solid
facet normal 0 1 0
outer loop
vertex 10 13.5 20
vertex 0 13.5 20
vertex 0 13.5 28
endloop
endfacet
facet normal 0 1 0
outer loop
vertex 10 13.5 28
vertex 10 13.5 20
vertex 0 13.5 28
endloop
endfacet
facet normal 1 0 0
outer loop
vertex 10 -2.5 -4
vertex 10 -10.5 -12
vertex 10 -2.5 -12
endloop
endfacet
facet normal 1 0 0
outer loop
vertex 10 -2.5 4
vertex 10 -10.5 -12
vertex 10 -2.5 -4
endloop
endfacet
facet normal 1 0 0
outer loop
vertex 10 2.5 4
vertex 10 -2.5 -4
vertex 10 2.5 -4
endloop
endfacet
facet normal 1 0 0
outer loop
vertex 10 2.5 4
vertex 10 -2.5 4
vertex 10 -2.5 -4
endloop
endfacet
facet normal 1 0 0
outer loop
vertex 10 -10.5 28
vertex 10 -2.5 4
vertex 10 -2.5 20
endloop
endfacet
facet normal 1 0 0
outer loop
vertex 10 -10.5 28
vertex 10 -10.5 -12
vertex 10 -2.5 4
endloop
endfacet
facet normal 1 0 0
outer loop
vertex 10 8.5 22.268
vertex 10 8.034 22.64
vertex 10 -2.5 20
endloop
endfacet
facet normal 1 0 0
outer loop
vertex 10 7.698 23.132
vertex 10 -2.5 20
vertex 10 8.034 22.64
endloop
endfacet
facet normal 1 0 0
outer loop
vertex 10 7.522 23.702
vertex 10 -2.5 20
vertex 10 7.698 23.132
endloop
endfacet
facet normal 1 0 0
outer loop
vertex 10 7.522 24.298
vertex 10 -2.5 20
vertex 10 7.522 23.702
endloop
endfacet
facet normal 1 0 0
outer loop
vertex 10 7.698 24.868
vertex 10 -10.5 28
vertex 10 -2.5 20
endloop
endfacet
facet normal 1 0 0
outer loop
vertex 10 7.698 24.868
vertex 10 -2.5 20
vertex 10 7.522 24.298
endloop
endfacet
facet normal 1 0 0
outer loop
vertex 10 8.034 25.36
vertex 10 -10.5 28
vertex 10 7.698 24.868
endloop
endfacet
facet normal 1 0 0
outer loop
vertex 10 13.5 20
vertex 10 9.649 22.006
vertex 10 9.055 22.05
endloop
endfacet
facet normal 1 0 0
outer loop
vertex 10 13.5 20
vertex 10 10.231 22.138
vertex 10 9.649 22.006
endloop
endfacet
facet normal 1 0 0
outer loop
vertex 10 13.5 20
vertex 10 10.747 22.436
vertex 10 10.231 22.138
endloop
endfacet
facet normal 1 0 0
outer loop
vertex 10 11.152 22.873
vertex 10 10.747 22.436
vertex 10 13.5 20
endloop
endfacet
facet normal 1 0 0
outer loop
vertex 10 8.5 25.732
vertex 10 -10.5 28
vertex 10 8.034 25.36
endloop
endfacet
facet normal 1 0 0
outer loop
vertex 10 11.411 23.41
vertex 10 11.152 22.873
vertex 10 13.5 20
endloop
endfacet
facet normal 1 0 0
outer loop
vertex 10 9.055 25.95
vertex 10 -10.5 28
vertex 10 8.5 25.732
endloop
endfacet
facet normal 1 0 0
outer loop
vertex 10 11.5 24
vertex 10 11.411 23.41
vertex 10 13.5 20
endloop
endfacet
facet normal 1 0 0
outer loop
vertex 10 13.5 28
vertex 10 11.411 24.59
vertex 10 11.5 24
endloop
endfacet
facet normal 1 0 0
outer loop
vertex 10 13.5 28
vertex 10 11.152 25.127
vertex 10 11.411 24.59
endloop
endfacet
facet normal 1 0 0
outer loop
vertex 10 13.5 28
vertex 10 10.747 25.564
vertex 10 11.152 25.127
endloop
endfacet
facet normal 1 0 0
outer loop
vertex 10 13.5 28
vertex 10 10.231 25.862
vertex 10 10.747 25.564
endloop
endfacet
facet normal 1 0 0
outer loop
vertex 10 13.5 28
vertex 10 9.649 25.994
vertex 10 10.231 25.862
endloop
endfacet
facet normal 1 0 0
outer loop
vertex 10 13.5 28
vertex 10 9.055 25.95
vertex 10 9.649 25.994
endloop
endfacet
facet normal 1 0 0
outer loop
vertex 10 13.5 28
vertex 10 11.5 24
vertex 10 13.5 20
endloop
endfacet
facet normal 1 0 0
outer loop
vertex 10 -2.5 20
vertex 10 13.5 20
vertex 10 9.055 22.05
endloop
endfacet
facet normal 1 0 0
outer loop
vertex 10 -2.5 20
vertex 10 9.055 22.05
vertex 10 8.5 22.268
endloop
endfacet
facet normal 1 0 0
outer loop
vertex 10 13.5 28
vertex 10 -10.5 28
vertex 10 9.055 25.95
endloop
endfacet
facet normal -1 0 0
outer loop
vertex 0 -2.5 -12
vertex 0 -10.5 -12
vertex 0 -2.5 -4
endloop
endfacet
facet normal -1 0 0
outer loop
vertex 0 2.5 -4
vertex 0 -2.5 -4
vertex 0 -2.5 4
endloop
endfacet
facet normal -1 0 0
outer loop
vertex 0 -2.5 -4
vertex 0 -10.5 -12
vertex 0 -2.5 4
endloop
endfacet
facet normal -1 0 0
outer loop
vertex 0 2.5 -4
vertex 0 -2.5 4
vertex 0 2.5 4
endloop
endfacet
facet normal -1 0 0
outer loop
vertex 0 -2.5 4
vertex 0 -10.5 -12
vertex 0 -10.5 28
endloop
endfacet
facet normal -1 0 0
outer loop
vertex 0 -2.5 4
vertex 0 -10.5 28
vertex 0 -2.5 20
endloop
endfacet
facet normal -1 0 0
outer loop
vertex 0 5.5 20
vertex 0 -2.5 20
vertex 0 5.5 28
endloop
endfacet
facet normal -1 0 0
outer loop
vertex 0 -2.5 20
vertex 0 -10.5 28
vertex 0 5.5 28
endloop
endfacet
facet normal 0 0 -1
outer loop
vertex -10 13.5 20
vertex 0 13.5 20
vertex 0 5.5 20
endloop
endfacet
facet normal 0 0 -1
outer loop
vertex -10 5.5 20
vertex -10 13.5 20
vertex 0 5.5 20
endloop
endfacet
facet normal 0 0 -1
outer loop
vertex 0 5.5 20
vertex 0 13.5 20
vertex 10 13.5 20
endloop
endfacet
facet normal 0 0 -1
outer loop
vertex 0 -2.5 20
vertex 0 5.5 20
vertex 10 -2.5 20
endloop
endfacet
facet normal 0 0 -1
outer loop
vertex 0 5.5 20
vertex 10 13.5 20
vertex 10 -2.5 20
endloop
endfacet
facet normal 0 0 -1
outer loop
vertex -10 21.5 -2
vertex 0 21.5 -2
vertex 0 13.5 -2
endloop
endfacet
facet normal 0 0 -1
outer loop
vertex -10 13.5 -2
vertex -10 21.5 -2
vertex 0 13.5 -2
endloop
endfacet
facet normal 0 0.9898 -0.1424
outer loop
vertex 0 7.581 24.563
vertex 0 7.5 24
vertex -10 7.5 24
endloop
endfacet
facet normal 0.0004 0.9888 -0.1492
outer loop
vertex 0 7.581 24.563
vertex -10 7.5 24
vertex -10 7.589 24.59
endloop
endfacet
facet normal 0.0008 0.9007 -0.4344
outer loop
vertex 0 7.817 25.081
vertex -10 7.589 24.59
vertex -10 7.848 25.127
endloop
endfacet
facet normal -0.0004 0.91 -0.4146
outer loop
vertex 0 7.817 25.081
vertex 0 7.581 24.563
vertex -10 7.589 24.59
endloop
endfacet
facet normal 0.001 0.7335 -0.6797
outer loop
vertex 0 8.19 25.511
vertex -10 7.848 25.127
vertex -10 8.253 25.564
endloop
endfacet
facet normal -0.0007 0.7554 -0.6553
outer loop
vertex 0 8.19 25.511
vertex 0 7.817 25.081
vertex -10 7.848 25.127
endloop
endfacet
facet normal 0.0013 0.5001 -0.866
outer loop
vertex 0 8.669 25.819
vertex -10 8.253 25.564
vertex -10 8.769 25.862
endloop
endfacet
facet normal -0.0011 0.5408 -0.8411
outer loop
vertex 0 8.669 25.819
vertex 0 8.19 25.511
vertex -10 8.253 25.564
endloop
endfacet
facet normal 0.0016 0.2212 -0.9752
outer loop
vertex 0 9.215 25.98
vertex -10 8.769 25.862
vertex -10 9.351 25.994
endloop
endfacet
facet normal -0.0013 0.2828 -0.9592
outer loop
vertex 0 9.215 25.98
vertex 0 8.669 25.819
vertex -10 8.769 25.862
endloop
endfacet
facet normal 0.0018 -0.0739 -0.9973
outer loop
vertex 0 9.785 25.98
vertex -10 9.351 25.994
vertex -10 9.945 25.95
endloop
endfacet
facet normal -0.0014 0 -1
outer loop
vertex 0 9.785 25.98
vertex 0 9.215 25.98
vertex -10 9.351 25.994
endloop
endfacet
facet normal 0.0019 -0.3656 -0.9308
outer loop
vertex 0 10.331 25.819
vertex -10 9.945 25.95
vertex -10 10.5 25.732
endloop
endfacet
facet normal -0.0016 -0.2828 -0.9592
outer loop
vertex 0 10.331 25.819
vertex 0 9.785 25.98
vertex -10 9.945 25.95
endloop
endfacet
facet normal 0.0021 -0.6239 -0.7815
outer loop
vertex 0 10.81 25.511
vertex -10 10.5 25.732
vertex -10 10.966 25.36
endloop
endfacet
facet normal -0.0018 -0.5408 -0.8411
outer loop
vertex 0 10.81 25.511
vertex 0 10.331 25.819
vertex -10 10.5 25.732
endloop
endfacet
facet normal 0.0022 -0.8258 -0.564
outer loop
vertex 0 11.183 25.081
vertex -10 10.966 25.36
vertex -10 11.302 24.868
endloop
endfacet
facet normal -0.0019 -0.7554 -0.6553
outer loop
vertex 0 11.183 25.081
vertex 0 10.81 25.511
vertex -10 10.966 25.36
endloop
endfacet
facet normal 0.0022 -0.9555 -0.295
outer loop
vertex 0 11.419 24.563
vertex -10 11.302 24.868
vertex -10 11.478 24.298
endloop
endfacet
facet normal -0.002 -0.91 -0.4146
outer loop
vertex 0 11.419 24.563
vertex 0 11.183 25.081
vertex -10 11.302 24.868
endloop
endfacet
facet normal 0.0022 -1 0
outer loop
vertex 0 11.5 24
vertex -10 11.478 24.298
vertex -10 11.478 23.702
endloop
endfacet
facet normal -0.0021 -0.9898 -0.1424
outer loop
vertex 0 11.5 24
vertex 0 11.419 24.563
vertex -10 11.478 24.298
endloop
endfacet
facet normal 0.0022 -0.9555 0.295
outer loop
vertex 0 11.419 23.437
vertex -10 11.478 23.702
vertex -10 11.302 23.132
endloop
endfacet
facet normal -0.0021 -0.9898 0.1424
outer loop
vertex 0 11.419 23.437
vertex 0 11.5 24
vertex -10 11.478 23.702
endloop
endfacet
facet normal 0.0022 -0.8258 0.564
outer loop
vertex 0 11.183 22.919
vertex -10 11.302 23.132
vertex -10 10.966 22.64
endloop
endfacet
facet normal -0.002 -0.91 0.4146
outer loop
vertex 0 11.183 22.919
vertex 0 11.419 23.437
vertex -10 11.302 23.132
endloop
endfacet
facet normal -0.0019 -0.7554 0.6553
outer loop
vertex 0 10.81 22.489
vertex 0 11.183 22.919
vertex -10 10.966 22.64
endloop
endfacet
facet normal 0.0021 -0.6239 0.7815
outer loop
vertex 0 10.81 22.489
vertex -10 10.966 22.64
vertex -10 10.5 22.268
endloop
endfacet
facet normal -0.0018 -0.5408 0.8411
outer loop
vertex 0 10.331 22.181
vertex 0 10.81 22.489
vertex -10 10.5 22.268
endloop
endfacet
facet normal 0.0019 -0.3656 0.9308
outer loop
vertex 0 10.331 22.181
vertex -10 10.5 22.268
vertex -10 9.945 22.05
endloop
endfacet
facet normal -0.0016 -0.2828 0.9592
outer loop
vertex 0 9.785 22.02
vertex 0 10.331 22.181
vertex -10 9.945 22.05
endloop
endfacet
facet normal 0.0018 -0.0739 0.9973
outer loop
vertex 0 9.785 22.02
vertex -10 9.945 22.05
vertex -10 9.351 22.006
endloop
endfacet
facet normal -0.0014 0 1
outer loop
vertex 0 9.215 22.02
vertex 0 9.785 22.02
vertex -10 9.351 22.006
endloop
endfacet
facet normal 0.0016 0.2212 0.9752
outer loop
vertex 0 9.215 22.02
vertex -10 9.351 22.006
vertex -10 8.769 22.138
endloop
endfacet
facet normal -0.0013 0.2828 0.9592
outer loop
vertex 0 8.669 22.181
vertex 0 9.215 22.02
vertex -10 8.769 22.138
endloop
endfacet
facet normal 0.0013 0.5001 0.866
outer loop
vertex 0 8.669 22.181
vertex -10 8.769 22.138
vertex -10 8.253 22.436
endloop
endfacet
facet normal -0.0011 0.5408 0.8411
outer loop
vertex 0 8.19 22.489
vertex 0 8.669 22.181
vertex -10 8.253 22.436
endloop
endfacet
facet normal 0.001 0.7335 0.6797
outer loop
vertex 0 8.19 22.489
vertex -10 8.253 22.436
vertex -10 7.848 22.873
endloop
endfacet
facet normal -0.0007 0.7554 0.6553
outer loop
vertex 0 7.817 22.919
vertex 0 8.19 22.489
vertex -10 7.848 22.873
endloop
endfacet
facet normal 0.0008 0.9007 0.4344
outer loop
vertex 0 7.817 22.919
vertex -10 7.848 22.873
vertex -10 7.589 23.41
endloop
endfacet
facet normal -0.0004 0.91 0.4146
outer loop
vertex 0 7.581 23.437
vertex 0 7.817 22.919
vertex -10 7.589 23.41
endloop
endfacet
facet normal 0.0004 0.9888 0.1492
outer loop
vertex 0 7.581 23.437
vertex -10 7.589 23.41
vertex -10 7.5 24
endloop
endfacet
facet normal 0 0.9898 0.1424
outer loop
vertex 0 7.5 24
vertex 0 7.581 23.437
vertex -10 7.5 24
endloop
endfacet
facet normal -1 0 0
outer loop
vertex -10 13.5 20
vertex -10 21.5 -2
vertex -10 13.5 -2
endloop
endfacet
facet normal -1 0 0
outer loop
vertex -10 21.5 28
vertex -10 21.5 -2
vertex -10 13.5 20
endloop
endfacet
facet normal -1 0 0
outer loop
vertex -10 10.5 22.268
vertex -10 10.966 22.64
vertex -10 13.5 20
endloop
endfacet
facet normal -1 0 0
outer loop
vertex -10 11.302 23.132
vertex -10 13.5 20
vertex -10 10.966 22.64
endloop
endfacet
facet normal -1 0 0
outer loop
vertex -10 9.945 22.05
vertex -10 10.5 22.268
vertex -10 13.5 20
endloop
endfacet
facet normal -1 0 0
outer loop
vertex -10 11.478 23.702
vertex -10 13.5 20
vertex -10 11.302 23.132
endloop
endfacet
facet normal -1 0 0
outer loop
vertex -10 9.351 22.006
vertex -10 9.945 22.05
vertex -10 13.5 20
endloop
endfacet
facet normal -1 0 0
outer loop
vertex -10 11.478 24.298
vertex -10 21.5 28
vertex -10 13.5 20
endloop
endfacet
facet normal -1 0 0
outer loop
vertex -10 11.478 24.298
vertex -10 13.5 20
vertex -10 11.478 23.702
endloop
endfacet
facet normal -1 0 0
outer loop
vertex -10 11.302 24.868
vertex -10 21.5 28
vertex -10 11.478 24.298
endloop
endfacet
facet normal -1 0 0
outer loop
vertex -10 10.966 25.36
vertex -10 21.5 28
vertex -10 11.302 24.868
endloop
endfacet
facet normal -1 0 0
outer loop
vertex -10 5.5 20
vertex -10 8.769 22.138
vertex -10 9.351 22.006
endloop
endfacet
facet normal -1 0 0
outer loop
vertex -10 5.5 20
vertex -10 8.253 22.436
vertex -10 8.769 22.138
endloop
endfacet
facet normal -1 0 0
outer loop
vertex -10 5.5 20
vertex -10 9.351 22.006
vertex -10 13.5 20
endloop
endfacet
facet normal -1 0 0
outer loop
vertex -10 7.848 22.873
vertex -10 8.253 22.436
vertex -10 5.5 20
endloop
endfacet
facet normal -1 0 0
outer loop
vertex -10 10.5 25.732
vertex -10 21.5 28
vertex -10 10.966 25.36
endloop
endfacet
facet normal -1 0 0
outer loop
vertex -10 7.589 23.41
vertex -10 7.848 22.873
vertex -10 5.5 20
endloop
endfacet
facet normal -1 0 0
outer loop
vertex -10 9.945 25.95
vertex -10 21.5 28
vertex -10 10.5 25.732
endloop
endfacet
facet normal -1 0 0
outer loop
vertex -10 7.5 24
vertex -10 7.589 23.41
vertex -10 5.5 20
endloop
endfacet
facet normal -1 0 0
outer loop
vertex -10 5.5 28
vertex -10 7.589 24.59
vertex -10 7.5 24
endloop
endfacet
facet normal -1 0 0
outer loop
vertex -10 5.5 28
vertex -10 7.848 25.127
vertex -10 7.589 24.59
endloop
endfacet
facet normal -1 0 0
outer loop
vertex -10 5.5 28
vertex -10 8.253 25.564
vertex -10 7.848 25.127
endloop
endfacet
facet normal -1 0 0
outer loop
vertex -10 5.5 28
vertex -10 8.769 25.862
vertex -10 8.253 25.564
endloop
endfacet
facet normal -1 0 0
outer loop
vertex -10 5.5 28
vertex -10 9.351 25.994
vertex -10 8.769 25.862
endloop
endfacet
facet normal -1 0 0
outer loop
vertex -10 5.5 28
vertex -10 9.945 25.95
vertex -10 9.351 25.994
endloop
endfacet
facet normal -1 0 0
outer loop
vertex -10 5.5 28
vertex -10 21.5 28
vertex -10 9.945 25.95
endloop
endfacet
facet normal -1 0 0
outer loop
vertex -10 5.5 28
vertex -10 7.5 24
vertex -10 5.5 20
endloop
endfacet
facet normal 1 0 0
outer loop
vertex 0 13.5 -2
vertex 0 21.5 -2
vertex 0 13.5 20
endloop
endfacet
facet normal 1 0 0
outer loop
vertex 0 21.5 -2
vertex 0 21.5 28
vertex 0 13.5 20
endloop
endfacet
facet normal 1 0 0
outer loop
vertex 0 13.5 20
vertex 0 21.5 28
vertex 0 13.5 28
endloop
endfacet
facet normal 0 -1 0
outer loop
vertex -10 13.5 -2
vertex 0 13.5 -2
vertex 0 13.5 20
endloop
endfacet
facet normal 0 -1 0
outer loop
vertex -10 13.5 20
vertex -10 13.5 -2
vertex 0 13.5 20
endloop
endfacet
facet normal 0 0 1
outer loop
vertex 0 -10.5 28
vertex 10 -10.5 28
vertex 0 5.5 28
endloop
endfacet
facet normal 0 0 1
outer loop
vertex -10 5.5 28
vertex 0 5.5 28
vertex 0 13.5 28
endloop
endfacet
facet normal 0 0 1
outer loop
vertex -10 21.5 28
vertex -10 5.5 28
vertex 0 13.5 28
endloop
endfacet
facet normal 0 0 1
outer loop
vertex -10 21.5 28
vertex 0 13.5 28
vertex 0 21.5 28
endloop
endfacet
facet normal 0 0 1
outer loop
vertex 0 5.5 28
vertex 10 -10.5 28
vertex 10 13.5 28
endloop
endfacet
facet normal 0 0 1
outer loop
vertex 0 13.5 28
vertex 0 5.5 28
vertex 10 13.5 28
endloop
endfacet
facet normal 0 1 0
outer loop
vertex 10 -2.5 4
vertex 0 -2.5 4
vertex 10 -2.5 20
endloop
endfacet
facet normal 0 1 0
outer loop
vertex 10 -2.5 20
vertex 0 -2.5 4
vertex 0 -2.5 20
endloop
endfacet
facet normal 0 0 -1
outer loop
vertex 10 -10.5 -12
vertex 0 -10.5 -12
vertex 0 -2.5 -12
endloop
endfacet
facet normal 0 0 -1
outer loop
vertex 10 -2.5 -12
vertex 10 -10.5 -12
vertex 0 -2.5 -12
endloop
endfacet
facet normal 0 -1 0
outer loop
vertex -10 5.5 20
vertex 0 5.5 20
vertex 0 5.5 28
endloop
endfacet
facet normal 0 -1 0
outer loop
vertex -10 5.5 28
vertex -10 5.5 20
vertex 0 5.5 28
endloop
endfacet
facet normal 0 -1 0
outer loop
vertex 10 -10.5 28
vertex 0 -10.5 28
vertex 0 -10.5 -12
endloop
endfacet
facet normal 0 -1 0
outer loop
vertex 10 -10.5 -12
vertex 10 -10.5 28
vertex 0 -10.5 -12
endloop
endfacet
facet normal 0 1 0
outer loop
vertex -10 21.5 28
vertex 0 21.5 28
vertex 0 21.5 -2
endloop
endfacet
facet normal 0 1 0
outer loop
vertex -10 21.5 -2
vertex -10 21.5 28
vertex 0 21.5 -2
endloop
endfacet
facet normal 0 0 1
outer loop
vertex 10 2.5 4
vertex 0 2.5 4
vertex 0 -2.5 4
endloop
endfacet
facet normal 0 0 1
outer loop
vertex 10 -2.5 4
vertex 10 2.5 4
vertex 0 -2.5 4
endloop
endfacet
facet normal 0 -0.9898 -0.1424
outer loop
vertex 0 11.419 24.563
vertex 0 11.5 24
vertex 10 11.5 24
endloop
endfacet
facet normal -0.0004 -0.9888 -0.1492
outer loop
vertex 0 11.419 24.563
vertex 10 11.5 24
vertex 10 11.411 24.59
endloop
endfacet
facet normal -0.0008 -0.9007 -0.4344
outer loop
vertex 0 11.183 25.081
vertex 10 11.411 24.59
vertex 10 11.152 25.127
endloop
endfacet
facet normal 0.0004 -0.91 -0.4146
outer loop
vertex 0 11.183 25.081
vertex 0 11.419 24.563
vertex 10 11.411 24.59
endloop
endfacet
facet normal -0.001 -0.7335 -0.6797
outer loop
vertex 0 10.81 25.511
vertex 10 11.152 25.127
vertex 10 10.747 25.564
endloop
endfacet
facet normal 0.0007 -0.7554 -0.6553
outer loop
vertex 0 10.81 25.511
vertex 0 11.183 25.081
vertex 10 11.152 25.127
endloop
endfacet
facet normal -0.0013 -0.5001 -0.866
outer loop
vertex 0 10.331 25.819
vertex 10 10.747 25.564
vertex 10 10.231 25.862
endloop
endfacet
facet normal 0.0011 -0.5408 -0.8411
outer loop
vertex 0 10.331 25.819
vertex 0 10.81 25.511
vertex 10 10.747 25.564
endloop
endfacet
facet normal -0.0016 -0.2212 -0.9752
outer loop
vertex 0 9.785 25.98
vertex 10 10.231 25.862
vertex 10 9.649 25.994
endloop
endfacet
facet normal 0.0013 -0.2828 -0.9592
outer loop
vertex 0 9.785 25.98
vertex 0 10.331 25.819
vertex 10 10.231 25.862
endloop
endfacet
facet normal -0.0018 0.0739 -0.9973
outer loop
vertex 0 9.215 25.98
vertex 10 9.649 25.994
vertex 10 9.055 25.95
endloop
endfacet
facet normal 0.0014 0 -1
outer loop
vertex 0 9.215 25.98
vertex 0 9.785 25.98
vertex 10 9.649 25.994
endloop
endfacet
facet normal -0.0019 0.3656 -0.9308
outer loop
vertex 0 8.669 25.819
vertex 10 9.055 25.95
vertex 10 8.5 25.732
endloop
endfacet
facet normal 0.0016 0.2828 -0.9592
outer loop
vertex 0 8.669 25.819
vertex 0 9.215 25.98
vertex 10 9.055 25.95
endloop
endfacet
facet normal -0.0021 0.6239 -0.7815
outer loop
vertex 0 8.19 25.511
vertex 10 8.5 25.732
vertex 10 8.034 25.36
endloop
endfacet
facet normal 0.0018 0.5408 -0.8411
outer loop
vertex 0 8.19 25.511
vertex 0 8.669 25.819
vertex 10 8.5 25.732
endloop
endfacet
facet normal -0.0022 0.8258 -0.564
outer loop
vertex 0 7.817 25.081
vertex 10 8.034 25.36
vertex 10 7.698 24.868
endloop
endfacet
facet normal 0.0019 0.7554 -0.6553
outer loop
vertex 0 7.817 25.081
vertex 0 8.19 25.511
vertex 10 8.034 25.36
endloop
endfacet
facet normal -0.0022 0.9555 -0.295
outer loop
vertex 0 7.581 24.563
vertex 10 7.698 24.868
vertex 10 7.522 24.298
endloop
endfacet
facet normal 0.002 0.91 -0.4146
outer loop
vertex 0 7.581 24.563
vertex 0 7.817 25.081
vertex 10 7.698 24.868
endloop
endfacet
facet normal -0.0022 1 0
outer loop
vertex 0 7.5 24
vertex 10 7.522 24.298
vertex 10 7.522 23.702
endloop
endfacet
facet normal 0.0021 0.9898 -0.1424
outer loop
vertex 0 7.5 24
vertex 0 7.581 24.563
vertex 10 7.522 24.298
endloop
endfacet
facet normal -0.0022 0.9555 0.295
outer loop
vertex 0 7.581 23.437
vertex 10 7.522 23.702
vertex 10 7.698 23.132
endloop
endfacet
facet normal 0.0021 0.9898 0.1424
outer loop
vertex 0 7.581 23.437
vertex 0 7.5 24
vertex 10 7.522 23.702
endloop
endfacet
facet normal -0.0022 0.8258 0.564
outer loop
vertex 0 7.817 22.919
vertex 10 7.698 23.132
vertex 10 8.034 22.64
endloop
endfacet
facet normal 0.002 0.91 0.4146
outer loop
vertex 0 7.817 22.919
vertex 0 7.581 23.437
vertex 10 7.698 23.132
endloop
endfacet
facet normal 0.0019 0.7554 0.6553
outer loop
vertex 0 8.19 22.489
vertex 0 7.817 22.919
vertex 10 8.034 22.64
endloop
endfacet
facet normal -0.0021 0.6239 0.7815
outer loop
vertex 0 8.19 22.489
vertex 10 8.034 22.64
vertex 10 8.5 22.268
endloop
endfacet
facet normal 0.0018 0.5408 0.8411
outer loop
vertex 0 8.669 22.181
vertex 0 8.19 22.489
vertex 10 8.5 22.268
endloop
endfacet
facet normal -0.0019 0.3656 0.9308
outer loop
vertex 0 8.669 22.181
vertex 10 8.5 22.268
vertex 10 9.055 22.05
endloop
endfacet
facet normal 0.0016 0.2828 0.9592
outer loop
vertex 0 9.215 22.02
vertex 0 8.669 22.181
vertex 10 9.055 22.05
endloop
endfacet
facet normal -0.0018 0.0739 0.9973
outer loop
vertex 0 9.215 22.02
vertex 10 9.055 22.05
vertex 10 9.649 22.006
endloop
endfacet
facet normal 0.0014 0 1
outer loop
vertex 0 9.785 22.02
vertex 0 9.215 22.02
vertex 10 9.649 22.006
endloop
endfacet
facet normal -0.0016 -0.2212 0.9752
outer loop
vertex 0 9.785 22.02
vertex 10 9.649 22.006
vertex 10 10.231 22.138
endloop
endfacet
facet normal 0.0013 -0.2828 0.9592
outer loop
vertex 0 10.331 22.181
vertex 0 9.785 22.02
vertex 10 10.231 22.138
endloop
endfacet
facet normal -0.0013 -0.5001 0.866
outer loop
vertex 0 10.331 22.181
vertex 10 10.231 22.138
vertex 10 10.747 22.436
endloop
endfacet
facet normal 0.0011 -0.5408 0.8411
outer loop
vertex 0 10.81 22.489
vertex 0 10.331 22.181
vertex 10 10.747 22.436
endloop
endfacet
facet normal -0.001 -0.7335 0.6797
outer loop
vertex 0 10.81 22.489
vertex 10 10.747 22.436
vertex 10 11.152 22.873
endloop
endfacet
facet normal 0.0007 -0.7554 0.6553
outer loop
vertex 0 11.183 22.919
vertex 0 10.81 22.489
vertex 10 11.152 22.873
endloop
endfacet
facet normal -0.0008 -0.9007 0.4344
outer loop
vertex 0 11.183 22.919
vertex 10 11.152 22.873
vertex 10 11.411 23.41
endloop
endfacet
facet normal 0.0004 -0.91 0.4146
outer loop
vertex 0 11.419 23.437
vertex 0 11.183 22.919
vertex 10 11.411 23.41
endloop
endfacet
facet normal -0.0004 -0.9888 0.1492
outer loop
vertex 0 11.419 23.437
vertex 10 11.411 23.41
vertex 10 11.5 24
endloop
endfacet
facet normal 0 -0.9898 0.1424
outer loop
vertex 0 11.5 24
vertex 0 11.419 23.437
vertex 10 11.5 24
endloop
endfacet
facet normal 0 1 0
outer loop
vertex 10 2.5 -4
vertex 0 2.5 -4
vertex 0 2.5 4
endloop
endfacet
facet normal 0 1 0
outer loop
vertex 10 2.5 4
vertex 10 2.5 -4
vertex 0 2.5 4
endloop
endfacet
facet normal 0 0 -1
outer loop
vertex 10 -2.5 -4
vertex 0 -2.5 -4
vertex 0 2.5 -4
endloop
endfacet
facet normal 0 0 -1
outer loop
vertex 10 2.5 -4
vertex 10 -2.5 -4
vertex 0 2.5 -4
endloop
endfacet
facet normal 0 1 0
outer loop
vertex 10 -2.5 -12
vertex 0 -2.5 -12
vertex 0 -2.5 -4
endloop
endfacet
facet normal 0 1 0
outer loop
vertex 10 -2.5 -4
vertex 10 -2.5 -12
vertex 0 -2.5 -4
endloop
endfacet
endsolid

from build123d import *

# Parameters (mm, degrees)
F0_R     = 2
F1_DEPTH = 10
F2_W     = 8
F2_H     = 8
F2_R     = 2
F3_DEPTH = 10


with BuildPart() as f1:
    # F0 (on Right) → F1 (new body)
    with BuildSketch(Plane.YZ):
        Polygon((2.5, -4), (2.5, 4), (-2.5, 4), (-2.5, 20), (13.5, 20), (13.5, 28), (-10.5, 28), (-10.5, -12), (-2.5, -12), (-2.5, -4), align=None)
        with Locations((9.5, 24)):
            Circle(F0_R, mode=Mode.SUBTRACT)
    extrude(amount=F1_DEPTH)

    # F2 (on face) → F3 (join)
    with BuildSketch(Plane(origin=(0, 0, 0), x_dir=(0, -1, 0), z_dir=(-1, 0, 0))):
        Polygon((-13.5, -2), (-13.5, 20), (-13.5, 28), (-21.5, 28), (-21.5, -2), align=None)
        with Locations((-9.5, 24)):
            Rectangle(F2_W, F2_H)
        with Locations((-9.5, 24)):
            Circle(F2_R, mode=Mode.SUBTRACT)
    extrude(amount=F3_DEPTH)


solid = f1.part
